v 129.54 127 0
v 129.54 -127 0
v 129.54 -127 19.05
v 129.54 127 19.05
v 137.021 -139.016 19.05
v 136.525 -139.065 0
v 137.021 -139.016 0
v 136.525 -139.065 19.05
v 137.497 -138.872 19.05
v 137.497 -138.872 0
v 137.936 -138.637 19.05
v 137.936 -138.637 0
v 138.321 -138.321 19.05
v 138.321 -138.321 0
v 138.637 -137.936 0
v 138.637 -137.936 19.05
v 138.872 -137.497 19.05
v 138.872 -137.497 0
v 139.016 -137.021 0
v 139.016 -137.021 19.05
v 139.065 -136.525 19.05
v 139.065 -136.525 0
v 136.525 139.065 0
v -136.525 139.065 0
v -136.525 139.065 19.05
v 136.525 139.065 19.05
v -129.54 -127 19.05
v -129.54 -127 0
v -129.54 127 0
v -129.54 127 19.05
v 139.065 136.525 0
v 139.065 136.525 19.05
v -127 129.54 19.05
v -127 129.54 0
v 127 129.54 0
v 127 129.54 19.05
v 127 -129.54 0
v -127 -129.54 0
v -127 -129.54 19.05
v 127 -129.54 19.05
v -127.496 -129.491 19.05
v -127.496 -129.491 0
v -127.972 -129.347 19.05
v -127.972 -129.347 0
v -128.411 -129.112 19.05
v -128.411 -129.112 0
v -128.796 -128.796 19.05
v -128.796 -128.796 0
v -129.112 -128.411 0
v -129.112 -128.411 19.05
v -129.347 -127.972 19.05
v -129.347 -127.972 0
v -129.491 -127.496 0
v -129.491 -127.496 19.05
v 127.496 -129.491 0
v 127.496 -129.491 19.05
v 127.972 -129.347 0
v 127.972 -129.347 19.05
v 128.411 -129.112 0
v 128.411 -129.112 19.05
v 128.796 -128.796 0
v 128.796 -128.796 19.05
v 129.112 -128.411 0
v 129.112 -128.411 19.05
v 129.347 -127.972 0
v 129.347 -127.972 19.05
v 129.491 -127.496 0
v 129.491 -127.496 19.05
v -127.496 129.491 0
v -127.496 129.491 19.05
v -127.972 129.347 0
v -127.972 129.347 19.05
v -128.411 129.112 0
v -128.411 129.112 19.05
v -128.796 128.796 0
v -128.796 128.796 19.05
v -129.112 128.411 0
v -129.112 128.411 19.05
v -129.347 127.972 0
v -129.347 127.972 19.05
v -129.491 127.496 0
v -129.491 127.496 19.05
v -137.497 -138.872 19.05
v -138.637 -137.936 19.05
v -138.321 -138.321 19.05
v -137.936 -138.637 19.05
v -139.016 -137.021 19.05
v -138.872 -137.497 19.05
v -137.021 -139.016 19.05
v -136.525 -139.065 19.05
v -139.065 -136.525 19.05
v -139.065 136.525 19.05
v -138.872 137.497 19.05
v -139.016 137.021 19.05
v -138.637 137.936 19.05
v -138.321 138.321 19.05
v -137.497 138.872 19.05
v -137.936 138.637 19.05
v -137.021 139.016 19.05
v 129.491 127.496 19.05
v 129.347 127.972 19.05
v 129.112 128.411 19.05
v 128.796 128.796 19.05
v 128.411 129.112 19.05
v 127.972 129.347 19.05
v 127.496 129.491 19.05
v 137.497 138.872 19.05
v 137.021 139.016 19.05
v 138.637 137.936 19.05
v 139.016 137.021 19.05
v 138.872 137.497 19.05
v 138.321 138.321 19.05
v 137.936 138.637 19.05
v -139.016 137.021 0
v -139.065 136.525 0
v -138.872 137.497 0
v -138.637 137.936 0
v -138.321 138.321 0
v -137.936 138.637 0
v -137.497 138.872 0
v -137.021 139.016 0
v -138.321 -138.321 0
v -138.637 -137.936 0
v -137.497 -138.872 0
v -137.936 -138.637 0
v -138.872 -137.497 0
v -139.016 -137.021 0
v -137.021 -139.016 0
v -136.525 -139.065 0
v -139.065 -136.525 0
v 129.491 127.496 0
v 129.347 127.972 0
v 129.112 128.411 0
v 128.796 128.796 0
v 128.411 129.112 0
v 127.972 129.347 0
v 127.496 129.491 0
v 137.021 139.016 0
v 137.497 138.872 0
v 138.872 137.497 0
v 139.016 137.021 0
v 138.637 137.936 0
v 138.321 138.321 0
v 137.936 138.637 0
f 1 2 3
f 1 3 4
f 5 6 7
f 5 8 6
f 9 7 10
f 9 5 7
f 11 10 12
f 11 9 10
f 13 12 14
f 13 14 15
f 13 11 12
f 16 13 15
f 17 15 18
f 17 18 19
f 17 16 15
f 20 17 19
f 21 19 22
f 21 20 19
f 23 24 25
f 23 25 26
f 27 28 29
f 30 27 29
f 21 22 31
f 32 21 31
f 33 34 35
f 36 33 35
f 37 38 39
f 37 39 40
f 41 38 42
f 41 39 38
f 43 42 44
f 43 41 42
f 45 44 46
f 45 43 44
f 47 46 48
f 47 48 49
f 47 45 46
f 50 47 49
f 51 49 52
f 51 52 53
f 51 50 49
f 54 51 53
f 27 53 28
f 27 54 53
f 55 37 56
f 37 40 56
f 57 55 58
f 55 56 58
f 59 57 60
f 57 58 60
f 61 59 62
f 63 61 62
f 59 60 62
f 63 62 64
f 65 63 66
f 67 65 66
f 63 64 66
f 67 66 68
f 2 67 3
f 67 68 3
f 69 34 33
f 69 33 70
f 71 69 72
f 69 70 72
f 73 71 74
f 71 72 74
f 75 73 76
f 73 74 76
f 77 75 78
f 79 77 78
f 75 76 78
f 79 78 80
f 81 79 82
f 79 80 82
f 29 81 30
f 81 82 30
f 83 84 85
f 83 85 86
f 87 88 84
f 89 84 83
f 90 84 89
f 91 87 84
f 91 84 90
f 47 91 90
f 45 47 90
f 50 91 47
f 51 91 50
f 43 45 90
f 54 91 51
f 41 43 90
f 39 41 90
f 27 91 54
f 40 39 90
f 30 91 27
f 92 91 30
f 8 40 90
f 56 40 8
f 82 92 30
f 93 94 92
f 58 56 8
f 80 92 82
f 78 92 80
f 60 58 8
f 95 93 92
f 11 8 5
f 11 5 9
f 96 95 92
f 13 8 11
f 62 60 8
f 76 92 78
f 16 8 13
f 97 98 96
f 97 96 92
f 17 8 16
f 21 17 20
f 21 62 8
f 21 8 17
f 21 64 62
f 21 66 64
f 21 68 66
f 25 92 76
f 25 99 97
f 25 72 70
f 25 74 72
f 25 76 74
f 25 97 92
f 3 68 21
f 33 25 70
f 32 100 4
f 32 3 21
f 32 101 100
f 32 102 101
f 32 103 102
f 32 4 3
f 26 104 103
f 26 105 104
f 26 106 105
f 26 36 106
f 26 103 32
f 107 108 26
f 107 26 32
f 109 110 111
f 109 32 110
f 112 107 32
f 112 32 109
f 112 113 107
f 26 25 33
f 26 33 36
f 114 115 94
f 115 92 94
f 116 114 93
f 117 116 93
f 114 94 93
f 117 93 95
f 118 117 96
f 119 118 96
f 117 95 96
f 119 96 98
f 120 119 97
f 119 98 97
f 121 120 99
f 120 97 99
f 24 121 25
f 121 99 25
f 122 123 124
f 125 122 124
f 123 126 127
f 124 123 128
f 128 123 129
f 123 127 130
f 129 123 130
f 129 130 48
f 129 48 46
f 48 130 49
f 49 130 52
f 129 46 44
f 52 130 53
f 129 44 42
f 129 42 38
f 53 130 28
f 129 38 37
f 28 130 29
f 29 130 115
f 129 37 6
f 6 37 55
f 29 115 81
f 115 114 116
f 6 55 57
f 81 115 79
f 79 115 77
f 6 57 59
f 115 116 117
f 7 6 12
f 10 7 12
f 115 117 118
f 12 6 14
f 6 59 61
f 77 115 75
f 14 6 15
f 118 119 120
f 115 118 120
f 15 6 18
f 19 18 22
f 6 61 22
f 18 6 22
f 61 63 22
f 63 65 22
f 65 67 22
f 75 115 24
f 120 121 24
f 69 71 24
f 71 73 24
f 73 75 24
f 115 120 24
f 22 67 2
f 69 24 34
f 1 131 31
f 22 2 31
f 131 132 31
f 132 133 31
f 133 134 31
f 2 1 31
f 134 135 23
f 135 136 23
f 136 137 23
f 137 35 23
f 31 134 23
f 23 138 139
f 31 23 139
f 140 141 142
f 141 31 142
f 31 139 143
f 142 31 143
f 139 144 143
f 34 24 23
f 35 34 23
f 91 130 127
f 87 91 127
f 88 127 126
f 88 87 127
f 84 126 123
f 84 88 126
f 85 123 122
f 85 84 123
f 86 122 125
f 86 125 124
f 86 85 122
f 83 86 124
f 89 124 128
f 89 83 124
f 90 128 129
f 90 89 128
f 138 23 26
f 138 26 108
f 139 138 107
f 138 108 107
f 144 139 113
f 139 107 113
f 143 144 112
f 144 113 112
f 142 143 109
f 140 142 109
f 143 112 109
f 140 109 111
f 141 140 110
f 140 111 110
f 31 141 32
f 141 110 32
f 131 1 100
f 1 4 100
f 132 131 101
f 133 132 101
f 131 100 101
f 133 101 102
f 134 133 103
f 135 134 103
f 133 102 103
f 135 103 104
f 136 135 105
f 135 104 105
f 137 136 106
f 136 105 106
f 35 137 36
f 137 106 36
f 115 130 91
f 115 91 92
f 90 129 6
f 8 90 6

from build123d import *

# Parameters (mm, degrees)
SKETCH1_W           = 278.13
SKETCH1_H           = 278.13
SKETCH1_W_2         = 259.08
SKETCH1_H_2         = 259.08
BOSS_EXTRUDE1_DEPTH = 19.05
FILLET1_R           = 2.54


with BuildPart() as part:
    # Sketch1 → Boss-Extrude1 (new body)
    with BuildSketch(Plane.XY):
        Rectangle(SKETCH1_W, SKETCH1_H)
        Rectangle(SKETCH1_W_2, SKETCH1_H_2, mode=Mode.SUBTRACT)
    extrude(amount=BOSS_EXTRUDE1_DEPTH)

    # Fillet1
    fillet1_edges = [part.edges().sort_by_distance(p)[0] for p in [
        (129.54, -129.54, 9.525),
        (129.54, 129.54, 9.525),
        (-129.54, 129.54, 9.525),
        (-129.54, -129.54, 9.525),
        (139.065, -139.065, 9.525),
        (-139.065, -139.065, 9.525),
        (-139.065, 139.065, 9.525),
        (139.065, 139.065, 9.525),
    ]]
    fillet(fillet1_edges, radius=FILLET1_R)


solid = part.part
